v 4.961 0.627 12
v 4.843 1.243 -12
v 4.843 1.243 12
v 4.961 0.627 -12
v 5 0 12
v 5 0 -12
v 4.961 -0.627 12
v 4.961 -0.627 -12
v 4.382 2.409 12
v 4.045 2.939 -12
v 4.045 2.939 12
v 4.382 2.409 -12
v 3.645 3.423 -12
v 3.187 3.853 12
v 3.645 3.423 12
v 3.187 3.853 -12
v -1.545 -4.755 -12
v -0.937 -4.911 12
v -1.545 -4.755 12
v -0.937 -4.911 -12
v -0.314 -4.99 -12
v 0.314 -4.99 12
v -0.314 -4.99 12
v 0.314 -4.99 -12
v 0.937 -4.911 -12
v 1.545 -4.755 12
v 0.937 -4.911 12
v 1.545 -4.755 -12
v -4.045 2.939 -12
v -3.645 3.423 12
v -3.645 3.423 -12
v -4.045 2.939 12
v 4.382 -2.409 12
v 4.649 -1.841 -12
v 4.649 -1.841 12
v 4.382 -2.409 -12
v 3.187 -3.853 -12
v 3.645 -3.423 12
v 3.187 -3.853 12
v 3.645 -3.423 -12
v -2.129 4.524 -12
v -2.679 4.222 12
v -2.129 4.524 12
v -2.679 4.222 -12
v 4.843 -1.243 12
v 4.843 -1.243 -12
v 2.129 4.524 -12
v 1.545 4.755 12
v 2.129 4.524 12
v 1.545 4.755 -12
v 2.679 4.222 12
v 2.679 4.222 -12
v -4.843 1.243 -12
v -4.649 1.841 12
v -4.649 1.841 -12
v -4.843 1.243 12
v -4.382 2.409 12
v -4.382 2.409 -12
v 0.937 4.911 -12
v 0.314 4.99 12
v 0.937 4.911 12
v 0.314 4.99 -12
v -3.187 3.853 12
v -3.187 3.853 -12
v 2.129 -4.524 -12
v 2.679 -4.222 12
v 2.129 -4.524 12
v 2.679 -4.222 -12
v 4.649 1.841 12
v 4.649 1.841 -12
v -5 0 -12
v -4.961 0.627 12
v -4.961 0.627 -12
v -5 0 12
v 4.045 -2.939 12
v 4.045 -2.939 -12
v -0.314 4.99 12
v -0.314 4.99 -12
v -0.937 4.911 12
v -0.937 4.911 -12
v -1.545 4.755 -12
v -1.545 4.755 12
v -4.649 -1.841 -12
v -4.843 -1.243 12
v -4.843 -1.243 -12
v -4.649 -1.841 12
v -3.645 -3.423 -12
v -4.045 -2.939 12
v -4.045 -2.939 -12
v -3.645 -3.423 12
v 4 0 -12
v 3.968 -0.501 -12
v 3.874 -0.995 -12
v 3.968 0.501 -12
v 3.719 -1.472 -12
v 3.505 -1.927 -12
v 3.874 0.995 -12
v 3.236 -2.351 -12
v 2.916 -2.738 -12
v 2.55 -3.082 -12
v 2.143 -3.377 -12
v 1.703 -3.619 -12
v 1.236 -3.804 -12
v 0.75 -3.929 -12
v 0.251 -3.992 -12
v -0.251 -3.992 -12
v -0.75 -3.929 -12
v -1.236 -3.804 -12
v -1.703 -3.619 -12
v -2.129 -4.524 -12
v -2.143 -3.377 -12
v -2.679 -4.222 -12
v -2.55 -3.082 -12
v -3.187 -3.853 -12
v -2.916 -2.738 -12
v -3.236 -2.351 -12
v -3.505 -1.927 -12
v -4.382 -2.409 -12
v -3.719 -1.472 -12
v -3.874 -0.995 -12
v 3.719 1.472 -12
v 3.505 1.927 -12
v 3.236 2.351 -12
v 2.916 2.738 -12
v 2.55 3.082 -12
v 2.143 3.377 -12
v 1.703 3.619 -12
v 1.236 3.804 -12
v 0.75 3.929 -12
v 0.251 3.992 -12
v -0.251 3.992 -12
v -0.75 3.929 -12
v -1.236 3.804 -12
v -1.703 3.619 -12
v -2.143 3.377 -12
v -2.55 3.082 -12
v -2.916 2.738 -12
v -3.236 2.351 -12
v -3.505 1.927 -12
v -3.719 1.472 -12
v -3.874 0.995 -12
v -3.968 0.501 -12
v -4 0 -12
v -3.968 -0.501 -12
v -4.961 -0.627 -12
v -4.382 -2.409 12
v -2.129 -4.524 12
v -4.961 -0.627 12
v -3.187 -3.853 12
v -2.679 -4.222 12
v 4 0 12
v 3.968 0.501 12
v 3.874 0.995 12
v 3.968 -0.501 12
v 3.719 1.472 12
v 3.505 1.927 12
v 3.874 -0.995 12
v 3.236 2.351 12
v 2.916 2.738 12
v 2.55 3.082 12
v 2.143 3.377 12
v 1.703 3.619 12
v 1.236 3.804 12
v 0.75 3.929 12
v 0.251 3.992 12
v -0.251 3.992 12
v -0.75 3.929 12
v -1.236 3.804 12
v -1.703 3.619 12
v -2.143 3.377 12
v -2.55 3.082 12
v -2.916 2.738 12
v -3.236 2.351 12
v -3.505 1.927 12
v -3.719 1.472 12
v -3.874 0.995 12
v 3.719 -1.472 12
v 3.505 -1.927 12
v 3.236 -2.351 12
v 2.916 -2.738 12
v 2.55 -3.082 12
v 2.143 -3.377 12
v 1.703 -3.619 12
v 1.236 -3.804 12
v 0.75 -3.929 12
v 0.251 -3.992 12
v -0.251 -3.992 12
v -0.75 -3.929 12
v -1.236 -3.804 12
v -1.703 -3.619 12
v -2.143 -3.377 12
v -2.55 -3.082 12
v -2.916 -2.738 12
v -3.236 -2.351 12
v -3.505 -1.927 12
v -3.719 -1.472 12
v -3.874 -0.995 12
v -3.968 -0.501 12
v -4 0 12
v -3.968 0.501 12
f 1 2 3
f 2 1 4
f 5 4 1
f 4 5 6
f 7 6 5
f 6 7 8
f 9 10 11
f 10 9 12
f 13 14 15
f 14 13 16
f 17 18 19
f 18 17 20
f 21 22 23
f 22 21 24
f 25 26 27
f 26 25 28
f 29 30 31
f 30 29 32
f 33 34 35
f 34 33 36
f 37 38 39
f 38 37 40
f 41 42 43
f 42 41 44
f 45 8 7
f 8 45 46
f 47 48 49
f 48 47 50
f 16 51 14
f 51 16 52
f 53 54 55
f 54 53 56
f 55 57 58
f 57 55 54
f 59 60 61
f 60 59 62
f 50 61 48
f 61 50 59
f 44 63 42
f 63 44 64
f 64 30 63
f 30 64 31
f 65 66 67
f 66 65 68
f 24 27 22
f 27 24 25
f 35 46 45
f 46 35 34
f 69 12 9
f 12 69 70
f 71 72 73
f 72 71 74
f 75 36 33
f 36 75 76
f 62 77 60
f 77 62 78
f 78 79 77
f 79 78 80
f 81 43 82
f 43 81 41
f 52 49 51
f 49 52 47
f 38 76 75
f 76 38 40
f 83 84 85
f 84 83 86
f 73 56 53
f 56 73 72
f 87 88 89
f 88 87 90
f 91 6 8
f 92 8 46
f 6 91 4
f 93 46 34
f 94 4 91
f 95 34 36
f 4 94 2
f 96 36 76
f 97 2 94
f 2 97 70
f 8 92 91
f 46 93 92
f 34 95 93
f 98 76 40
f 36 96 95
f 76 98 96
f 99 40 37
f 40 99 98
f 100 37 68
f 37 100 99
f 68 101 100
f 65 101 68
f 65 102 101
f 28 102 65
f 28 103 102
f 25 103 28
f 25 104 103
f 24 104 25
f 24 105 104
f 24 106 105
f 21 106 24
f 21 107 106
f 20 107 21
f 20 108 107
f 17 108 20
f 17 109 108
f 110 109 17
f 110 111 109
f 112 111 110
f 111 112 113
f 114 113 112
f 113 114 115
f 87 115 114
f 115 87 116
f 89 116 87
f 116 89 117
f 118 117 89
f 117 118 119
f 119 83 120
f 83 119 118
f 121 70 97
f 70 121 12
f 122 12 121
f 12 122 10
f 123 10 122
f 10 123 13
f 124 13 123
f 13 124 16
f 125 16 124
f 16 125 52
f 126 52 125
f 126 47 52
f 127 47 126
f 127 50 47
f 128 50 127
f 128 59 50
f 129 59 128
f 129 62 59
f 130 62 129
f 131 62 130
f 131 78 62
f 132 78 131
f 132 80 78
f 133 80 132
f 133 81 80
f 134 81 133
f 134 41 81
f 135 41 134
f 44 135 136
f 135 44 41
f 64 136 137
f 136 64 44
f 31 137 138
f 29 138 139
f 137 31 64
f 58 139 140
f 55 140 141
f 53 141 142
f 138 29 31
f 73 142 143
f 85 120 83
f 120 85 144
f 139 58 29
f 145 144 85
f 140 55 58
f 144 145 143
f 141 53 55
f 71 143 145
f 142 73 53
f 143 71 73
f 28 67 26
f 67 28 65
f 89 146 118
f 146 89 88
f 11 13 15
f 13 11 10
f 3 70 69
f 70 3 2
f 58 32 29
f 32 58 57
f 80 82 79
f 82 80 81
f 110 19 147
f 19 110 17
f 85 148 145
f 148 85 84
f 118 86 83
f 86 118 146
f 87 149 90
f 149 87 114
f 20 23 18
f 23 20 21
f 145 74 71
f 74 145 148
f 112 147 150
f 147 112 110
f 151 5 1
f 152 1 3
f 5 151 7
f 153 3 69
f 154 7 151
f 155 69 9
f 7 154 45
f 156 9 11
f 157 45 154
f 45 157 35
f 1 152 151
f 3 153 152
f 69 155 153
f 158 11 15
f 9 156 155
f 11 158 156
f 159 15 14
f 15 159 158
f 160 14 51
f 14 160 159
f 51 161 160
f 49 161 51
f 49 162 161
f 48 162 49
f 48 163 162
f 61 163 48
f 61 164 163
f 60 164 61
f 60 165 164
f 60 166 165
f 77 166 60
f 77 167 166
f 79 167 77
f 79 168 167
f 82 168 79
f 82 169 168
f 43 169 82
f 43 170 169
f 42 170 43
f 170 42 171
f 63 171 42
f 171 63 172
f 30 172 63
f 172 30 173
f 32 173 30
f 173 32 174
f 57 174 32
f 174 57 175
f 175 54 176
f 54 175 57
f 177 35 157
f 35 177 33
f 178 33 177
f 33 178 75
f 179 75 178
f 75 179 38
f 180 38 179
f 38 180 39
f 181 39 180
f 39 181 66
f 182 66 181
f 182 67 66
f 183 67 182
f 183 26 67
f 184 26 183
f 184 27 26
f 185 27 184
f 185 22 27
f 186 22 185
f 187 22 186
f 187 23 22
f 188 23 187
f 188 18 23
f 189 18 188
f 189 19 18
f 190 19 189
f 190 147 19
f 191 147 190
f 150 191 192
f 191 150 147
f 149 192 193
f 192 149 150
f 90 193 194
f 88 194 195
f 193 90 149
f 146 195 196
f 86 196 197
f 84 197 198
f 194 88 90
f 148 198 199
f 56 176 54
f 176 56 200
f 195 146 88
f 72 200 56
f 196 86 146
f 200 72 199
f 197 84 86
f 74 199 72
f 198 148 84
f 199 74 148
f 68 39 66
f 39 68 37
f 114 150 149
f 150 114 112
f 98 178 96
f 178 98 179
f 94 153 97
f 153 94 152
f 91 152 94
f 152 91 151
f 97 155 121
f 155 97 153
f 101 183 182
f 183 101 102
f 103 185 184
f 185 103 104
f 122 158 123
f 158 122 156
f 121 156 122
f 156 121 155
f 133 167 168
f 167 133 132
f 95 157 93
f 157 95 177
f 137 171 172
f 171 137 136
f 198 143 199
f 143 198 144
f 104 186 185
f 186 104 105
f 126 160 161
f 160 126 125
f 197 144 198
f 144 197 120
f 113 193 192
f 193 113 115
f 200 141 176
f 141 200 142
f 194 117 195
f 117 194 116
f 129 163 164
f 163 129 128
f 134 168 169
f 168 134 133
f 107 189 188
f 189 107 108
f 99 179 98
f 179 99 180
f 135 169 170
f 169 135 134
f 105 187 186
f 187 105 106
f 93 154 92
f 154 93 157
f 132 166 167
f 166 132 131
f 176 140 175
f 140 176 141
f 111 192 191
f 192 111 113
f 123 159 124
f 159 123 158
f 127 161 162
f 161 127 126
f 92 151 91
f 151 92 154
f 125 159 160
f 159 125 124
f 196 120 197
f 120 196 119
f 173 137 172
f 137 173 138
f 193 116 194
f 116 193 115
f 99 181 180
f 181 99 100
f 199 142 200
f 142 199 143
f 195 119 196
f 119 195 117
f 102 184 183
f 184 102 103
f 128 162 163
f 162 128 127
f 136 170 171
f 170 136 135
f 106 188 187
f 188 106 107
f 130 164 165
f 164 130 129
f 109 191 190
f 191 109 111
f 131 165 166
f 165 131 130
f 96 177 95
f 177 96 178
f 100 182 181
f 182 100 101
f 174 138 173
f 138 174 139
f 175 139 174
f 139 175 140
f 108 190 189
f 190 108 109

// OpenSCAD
$fn = 50;


difference() {
	union() {
		translate(v = [0, 0, -12.0000000000]) {
			cylinder(h = 24, r = 5.0000000000);
		}
	}
	union() {
		translate(v = [0, 0, -100.0000000000]) {
			cylinder(h = 200, r = 4.0000000000);
		}
	}
}
